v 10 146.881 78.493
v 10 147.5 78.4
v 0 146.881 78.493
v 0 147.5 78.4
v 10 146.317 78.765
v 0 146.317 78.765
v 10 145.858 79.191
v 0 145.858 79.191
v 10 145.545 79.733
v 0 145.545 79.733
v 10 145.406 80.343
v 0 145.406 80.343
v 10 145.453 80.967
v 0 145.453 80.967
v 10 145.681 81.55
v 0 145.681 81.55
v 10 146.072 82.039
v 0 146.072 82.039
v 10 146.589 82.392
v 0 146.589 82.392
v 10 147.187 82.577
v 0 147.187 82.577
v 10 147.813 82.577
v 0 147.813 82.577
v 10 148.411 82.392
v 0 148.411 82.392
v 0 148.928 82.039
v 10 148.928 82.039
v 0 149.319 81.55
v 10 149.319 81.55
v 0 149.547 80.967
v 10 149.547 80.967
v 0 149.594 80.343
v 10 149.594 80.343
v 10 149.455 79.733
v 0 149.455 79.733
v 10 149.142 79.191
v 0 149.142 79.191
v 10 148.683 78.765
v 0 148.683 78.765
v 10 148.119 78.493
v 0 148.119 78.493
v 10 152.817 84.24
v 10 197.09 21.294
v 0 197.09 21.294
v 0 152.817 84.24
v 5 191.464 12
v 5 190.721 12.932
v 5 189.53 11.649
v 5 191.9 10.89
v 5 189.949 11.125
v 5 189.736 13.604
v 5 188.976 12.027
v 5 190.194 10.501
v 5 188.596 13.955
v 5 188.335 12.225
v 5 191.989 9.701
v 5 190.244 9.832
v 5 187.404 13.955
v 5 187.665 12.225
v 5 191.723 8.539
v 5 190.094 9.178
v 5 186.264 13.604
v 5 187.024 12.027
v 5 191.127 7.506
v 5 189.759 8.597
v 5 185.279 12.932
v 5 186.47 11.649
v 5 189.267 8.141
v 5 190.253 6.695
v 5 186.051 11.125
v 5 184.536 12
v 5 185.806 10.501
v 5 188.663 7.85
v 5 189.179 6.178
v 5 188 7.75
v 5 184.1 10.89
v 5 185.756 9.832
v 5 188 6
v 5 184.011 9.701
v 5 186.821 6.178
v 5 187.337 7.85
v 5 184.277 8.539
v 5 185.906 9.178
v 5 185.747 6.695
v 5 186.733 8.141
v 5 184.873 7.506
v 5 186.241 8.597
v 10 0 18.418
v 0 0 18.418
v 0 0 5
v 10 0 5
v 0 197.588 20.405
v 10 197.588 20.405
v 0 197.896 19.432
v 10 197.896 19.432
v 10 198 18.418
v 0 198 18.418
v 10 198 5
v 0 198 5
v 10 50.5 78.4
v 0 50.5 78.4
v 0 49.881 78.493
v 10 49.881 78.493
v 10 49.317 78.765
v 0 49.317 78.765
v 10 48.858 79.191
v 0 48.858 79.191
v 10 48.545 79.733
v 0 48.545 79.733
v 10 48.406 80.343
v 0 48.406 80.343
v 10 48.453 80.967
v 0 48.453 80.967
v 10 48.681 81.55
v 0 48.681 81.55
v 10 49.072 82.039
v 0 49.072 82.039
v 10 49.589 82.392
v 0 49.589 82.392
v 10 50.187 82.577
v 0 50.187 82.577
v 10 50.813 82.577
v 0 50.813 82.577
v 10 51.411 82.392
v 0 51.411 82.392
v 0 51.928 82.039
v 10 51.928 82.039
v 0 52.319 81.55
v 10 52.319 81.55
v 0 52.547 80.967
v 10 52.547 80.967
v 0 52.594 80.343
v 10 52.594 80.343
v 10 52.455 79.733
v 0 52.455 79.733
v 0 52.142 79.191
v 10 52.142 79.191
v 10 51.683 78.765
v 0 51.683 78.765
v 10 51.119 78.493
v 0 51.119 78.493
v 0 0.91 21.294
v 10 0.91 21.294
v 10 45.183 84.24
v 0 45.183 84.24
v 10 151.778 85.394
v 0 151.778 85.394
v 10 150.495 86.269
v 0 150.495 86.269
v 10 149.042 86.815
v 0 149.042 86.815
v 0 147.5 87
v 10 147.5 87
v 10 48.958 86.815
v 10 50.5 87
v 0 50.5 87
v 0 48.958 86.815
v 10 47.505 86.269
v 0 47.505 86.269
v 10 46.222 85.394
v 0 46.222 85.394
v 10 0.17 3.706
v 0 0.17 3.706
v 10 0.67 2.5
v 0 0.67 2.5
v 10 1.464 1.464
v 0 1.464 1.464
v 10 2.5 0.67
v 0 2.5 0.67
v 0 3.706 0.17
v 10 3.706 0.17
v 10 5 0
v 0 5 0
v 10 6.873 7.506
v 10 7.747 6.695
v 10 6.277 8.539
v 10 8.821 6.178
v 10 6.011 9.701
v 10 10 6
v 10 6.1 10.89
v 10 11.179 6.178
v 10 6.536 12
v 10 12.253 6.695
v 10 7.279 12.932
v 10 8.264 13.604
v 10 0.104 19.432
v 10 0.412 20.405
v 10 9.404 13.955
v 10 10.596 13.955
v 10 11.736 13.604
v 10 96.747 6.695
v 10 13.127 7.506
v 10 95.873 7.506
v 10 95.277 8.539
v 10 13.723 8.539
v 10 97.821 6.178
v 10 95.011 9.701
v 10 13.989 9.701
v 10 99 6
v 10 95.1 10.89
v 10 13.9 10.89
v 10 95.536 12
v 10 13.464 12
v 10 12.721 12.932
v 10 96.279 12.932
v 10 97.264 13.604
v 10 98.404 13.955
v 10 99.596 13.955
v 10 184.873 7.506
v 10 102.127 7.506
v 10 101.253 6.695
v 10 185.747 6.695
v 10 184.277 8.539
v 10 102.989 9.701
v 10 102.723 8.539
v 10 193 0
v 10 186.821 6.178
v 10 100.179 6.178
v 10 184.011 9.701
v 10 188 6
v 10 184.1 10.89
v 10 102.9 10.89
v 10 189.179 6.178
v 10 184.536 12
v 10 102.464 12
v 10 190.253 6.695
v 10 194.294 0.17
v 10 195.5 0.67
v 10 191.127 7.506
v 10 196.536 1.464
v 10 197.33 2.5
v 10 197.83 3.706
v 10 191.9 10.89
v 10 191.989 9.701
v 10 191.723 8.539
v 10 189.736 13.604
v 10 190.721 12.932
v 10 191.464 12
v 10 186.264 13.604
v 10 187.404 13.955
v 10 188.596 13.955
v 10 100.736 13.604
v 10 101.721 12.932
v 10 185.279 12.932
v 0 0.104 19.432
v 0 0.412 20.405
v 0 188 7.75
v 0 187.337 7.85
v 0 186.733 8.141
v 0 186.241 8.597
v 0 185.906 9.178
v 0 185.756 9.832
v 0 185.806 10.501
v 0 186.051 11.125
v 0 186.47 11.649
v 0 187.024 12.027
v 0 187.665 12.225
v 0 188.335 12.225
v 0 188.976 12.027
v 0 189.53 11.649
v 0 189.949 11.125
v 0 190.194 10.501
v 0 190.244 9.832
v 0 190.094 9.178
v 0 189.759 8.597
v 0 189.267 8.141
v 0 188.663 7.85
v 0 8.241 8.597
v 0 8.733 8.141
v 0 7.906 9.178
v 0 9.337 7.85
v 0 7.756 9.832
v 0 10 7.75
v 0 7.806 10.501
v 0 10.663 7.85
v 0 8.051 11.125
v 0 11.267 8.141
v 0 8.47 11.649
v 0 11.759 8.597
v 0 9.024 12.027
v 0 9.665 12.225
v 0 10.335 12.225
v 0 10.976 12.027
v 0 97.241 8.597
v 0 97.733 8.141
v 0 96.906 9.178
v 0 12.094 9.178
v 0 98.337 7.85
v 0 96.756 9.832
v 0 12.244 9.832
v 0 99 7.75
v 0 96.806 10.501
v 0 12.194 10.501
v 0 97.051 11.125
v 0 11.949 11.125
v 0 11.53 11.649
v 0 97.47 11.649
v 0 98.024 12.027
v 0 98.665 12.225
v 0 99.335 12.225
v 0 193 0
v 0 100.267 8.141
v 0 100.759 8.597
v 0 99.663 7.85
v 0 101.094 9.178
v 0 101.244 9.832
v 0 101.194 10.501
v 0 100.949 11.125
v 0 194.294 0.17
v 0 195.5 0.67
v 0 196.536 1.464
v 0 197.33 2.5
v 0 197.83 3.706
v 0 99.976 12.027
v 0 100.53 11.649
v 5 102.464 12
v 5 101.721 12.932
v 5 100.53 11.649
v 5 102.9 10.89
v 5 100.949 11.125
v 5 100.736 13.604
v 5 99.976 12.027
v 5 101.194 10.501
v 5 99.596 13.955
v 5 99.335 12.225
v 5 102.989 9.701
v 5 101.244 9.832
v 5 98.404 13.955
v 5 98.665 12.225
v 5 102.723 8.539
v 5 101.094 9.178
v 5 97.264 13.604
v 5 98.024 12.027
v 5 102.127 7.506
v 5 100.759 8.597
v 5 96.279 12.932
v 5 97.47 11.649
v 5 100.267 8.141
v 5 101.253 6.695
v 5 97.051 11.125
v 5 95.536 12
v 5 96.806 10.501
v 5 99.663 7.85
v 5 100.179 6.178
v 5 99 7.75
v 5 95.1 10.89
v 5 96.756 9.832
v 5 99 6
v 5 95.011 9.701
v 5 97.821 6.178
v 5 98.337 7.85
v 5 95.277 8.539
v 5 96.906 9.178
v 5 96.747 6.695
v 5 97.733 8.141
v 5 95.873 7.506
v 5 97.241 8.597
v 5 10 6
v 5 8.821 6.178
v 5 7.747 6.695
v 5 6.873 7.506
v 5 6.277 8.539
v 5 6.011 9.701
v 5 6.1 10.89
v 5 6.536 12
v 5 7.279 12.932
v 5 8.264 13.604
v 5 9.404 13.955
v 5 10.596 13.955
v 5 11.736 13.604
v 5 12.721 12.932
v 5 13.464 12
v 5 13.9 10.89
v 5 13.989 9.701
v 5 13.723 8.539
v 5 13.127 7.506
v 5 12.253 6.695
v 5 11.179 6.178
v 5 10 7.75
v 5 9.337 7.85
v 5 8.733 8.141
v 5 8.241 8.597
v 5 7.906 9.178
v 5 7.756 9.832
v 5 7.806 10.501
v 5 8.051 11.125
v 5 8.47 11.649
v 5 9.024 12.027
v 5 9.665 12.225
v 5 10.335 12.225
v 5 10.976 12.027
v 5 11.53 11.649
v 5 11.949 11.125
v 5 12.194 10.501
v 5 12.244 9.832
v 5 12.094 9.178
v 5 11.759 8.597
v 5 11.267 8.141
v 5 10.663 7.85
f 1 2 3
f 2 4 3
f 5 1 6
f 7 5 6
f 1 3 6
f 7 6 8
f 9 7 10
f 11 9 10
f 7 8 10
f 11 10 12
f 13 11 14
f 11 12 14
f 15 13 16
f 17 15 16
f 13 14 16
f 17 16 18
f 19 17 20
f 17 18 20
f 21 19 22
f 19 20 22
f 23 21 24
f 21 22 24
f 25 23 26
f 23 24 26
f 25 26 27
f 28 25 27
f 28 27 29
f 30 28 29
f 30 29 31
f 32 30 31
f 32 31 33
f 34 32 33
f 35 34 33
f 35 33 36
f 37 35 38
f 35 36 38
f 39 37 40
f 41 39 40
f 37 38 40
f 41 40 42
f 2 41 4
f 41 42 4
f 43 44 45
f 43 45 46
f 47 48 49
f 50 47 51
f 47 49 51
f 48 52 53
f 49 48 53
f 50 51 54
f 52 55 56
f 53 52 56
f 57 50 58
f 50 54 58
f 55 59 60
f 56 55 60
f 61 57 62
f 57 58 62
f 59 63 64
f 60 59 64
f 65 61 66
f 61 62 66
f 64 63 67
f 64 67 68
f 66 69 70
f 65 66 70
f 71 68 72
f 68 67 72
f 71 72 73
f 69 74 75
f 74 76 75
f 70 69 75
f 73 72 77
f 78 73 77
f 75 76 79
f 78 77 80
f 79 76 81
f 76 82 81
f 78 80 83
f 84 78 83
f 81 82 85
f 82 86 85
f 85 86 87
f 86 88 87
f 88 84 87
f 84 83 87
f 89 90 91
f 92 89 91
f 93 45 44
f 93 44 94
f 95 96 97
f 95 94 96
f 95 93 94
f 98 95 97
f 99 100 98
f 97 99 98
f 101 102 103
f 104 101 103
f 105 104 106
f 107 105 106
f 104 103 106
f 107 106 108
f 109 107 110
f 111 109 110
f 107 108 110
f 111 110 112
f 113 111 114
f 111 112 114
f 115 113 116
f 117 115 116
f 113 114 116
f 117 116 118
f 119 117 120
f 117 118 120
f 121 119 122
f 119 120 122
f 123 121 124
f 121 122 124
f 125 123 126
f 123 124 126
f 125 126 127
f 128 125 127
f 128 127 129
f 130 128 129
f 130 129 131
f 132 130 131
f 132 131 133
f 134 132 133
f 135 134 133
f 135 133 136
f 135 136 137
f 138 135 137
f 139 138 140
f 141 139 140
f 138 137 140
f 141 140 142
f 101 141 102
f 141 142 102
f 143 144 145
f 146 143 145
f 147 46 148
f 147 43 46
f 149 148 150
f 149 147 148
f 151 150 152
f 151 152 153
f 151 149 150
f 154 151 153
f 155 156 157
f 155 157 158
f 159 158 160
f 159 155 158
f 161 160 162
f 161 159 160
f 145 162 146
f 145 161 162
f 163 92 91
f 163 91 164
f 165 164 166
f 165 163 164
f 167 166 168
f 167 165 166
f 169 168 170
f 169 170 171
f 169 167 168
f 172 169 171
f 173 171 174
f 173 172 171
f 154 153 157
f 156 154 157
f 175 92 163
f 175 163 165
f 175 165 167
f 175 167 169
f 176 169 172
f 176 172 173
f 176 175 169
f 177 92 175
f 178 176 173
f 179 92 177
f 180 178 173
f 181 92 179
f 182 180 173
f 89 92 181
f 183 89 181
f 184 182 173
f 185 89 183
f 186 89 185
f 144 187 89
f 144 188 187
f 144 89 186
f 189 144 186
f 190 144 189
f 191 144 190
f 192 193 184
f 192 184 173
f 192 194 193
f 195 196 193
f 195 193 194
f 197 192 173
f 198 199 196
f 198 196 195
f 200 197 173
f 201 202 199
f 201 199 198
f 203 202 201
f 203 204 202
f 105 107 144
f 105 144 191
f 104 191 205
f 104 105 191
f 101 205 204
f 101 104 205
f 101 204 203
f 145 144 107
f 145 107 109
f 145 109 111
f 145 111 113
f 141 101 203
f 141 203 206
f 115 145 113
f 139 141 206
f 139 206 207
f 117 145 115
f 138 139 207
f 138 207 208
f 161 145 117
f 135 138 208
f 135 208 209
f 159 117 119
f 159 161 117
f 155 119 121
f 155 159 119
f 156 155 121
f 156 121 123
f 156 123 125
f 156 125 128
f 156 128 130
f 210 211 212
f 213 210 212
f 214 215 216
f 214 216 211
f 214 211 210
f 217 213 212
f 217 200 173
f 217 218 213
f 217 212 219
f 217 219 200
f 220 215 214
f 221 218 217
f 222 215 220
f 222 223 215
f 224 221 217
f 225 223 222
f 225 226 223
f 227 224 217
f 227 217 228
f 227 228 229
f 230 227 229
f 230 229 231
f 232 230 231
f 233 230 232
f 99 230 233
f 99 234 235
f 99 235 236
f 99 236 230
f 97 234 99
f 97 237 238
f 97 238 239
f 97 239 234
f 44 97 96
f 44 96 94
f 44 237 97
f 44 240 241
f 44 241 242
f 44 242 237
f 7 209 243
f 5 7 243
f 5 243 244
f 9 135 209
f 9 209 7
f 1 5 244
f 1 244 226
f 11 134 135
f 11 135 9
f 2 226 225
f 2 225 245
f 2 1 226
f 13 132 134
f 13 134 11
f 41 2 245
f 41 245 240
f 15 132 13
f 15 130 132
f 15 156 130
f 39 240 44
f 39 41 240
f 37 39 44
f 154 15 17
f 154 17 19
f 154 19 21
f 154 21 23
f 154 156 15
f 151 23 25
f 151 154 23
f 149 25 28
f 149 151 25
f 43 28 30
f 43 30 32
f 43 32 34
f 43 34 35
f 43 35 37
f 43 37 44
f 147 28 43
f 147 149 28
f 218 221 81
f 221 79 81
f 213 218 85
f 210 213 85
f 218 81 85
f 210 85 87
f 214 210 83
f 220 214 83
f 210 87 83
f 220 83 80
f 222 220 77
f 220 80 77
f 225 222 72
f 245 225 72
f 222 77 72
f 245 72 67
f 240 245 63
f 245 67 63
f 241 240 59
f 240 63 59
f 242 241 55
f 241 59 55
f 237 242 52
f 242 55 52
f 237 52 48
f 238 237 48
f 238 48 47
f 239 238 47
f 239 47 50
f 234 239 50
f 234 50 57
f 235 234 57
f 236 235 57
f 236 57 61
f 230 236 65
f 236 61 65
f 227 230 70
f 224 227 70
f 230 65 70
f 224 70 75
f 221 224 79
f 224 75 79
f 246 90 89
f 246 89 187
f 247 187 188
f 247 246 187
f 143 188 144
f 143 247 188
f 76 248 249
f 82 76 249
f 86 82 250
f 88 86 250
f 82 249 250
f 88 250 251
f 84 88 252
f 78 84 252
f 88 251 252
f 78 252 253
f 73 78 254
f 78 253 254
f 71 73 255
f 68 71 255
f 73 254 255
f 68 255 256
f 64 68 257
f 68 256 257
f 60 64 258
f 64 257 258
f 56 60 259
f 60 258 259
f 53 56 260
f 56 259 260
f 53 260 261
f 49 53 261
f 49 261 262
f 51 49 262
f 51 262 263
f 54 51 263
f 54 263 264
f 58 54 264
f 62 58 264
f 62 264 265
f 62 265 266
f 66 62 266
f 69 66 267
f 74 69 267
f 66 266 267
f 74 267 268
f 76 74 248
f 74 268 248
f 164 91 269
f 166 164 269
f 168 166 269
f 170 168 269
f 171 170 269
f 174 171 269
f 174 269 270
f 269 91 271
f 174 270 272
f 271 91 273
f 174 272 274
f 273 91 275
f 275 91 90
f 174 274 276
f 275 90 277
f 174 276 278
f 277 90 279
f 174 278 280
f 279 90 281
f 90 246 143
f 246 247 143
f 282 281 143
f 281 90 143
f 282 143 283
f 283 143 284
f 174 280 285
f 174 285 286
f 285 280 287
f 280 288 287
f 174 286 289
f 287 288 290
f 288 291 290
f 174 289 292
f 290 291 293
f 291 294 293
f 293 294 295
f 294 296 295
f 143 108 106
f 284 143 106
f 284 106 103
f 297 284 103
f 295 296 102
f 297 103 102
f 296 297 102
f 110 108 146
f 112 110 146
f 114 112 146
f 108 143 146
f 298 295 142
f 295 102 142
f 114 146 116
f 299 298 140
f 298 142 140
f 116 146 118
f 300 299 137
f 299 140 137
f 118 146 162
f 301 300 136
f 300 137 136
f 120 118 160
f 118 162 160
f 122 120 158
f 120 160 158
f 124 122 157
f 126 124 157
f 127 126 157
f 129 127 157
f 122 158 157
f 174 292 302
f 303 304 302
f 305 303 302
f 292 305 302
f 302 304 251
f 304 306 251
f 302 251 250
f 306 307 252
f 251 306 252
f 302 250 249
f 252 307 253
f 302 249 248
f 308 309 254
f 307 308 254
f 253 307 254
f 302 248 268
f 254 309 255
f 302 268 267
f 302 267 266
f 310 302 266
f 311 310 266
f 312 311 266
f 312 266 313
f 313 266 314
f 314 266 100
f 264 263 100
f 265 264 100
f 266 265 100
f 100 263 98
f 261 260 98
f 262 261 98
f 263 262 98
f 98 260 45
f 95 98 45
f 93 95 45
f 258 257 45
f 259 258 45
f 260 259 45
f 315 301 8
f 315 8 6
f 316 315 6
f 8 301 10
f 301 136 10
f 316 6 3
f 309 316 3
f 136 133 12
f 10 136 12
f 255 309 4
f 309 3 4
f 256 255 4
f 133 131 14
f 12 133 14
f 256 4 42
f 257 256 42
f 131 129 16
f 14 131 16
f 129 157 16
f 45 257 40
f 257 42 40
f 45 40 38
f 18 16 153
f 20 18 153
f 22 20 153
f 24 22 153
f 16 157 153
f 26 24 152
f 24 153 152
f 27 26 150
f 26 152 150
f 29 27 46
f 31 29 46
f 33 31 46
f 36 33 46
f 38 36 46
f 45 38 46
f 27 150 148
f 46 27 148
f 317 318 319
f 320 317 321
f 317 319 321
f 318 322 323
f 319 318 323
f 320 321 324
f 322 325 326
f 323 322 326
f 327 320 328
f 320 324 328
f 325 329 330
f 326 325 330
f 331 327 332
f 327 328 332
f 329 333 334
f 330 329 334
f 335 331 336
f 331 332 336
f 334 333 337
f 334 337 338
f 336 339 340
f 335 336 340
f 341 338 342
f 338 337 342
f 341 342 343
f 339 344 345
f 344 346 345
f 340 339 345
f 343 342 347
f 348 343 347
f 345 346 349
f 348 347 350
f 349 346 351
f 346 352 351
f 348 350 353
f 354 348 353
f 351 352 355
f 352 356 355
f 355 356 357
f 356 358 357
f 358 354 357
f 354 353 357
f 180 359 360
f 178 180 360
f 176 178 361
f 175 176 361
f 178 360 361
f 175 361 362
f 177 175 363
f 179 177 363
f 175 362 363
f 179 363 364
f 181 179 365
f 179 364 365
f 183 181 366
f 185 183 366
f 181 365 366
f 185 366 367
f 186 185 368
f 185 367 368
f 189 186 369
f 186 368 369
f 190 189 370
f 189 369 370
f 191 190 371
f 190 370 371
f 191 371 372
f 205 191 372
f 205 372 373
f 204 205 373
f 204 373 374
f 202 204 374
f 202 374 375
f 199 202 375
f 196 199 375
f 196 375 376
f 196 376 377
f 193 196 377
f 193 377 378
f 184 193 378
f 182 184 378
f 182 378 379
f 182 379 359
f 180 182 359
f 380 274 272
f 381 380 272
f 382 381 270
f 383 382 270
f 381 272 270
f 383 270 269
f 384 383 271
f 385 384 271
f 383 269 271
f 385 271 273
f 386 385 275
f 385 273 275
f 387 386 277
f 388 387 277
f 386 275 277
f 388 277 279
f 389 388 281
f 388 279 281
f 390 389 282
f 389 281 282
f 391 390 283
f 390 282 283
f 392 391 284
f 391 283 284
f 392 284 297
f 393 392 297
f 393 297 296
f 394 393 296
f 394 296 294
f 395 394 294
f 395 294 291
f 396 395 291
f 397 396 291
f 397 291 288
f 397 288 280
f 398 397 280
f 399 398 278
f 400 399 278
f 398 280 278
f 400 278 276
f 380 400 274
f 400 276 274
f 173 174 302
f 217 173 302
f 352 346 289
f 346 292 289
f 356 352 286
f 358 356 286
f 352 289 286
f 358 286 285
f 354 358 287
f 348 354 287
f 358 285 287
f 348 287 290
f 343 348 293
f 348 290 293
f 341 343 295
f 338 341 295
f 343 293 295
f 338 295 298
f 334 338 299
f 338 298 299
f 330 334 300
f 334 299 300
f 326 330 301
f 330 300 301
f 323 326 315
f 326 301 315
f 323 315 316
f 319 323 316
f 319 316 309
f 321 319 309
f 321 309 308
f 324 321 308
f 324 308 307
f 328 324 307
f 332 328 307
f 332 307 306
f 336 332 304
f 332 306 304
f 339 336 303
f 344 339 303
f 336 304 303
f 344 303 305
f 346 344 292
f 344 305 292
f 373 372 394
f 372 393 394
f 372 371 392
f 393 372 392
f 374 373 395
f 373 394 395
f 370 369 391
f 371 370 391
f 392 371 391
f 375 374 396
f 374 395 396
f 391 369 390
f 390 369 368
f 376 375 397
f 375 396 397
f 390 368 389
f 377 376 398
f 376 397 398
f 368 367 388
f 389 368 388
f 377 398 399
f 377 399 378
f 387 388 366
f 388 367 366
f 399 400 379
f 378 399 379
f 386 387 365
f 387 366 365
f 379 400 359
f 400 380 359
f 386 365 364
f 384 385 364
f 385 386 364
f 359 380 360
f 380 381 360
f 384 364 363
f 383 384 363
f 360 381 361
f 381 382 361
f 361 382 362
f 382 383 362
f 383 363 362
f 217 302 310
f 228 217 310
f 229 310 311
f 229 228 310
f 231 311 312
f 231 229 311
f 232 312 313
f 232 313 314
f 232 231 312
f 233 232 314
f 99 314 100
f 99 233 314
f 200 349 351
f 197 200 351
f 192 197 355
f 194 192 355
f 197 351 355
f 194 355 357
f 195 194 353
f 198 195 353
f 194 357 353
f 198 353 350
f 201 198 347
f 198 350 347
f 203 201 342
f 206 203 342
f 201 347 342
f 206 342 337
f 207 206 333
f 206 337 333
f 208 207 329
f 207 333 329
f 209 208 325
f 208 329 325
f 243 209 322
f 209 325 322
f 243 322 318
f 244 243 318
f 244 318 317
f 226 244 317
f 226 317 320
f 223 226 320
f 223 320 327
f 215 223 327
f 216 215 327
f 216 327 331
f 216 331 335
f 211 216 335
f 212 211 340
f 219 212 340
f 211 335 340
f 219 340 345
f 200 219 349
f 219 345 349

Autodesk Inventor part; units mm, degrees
ref_plane "YZ Plane" through (0, 0, 0) normal (1, 0, 0) x (0, 1, 0)
ref_plane "XZ Plane" through (0, 0, 0) normal (0, 1, 0) x (-1, 0, 0)
ref_plane "XY Plane" through (0, 0, 0) normal (0, 0, 1) x (1, 0, 0)
sketch "Skizze1" plane through (0, 0, 0) normal (1, 0, 0) x (0, 1, 0)
  line L0 (0, 0) -> (198, 0)
  line L1 (198, 0) -> (198, 87)
  line L2 (198, 87) -> (0, 87)
  line L3 (0, 87) -> (0, 0)
  dimension "d0" = 198
  dimension "d1" = 87
extrude "Extrusion1" add sketch "Skizze1" along normal blind 10
sketch "Skizze2" plane through (10, 0, 0) normal (1, 0, 0) x (0, 0, -1)
  line L0 (-87, 0) -> (0, 0) projected
  line L1 (-80.5, 147.5) -> (-80.5, 50.5) construction
  line L2 (0, 0) -> (0, 198) projected
  dimension "d4" = 97
  dimension "d5" = 50.5
  dimension "d6" = 80.5
hole "Bohrung1" at (10, 147.5, 80.5) at (10, 50.5, 80.5) direction (-1, 0, 0) diameter 4.2 depth 10
sketch "Skizze3" plane through (10, 0, 0) normal (1, 0, 0) x (0, 0, -1)
  circle A0 centre (-80.5, 147.5) radius 2.1 projected
  circle A1 centre (-80.5, 50.5) radius 2.1 projected
  arc A2 (-87, 50.5) -> (-84.2395, 45.1834) centre (-80.5, 50.5) ccw
  arc A3 (-84.2395, 152.8166) -> (-87, 147.5) centre (-80.5, 147.5) ccw
  line L0 (0, 0) -> (0, 198) projected
  line L1 (0, 198) -> (-20, 198) construction
  line L2 (0, 0) -> (-20, 0) construction
  line L3 (-87, 0) -> (0, 0) projected
  line L4 (-20, 0) -> (-84.2395, 45.1834)
  line L5 (-20, 198) -> (-84.2395, 152.8166)
  line L6 (-87, 198) -> (-87, 0) projected
  line L7 (-20, 198) -> (-87, 198)
  line L8 (-87, 147.5) -> (-87, 198)
  line L9 (-87, 50.5) -> (-87, 0)
  line L10 (-87, 0) -> (-20, 0)
  dimension "d15" = 20
extrude "Extrusion2" cut sketch "Skizze3" against normal up to surface (10 mm away) contours L6 L7 L5 A3 | A2 L4 L3 L6
sketch "Skizze4" plane through (10, 0, 0) normal (1, 0, 0) x (0, 0, -1)
  line L0 (0, 0) -> (0, 198) projected
  line L1 (-20, 0) -> (0, 0) projected
  line L2 (0, 198) -> (-20, 198) projected
  line L3 (-87, 147.5) -> (-87, 50.5) projected
  line L4 (-87, 99) -> (0, 99)
  point P0 (-10, 10)
  point P1 (-10, 188)
  point P2 (-10, 99)
  dimension "d18" = 10
  dimension "d19" = 10
  dimension "d20" = 10
hole "Bohrung2" at (10, 10, 10) at (10, 188, 10) at (10, 99, 10) direction (-1, 0, 0) diameter 4.5 end through all counterbore diameter 8 counterbore depth 5
fillet "Rundung1" radius 5 4 edges at (5, 198, 20) (5, 0, 20) (5, 0, 0) (5, 198, 0)
properties part number "102.006.01_Anbindung_Aktor"
